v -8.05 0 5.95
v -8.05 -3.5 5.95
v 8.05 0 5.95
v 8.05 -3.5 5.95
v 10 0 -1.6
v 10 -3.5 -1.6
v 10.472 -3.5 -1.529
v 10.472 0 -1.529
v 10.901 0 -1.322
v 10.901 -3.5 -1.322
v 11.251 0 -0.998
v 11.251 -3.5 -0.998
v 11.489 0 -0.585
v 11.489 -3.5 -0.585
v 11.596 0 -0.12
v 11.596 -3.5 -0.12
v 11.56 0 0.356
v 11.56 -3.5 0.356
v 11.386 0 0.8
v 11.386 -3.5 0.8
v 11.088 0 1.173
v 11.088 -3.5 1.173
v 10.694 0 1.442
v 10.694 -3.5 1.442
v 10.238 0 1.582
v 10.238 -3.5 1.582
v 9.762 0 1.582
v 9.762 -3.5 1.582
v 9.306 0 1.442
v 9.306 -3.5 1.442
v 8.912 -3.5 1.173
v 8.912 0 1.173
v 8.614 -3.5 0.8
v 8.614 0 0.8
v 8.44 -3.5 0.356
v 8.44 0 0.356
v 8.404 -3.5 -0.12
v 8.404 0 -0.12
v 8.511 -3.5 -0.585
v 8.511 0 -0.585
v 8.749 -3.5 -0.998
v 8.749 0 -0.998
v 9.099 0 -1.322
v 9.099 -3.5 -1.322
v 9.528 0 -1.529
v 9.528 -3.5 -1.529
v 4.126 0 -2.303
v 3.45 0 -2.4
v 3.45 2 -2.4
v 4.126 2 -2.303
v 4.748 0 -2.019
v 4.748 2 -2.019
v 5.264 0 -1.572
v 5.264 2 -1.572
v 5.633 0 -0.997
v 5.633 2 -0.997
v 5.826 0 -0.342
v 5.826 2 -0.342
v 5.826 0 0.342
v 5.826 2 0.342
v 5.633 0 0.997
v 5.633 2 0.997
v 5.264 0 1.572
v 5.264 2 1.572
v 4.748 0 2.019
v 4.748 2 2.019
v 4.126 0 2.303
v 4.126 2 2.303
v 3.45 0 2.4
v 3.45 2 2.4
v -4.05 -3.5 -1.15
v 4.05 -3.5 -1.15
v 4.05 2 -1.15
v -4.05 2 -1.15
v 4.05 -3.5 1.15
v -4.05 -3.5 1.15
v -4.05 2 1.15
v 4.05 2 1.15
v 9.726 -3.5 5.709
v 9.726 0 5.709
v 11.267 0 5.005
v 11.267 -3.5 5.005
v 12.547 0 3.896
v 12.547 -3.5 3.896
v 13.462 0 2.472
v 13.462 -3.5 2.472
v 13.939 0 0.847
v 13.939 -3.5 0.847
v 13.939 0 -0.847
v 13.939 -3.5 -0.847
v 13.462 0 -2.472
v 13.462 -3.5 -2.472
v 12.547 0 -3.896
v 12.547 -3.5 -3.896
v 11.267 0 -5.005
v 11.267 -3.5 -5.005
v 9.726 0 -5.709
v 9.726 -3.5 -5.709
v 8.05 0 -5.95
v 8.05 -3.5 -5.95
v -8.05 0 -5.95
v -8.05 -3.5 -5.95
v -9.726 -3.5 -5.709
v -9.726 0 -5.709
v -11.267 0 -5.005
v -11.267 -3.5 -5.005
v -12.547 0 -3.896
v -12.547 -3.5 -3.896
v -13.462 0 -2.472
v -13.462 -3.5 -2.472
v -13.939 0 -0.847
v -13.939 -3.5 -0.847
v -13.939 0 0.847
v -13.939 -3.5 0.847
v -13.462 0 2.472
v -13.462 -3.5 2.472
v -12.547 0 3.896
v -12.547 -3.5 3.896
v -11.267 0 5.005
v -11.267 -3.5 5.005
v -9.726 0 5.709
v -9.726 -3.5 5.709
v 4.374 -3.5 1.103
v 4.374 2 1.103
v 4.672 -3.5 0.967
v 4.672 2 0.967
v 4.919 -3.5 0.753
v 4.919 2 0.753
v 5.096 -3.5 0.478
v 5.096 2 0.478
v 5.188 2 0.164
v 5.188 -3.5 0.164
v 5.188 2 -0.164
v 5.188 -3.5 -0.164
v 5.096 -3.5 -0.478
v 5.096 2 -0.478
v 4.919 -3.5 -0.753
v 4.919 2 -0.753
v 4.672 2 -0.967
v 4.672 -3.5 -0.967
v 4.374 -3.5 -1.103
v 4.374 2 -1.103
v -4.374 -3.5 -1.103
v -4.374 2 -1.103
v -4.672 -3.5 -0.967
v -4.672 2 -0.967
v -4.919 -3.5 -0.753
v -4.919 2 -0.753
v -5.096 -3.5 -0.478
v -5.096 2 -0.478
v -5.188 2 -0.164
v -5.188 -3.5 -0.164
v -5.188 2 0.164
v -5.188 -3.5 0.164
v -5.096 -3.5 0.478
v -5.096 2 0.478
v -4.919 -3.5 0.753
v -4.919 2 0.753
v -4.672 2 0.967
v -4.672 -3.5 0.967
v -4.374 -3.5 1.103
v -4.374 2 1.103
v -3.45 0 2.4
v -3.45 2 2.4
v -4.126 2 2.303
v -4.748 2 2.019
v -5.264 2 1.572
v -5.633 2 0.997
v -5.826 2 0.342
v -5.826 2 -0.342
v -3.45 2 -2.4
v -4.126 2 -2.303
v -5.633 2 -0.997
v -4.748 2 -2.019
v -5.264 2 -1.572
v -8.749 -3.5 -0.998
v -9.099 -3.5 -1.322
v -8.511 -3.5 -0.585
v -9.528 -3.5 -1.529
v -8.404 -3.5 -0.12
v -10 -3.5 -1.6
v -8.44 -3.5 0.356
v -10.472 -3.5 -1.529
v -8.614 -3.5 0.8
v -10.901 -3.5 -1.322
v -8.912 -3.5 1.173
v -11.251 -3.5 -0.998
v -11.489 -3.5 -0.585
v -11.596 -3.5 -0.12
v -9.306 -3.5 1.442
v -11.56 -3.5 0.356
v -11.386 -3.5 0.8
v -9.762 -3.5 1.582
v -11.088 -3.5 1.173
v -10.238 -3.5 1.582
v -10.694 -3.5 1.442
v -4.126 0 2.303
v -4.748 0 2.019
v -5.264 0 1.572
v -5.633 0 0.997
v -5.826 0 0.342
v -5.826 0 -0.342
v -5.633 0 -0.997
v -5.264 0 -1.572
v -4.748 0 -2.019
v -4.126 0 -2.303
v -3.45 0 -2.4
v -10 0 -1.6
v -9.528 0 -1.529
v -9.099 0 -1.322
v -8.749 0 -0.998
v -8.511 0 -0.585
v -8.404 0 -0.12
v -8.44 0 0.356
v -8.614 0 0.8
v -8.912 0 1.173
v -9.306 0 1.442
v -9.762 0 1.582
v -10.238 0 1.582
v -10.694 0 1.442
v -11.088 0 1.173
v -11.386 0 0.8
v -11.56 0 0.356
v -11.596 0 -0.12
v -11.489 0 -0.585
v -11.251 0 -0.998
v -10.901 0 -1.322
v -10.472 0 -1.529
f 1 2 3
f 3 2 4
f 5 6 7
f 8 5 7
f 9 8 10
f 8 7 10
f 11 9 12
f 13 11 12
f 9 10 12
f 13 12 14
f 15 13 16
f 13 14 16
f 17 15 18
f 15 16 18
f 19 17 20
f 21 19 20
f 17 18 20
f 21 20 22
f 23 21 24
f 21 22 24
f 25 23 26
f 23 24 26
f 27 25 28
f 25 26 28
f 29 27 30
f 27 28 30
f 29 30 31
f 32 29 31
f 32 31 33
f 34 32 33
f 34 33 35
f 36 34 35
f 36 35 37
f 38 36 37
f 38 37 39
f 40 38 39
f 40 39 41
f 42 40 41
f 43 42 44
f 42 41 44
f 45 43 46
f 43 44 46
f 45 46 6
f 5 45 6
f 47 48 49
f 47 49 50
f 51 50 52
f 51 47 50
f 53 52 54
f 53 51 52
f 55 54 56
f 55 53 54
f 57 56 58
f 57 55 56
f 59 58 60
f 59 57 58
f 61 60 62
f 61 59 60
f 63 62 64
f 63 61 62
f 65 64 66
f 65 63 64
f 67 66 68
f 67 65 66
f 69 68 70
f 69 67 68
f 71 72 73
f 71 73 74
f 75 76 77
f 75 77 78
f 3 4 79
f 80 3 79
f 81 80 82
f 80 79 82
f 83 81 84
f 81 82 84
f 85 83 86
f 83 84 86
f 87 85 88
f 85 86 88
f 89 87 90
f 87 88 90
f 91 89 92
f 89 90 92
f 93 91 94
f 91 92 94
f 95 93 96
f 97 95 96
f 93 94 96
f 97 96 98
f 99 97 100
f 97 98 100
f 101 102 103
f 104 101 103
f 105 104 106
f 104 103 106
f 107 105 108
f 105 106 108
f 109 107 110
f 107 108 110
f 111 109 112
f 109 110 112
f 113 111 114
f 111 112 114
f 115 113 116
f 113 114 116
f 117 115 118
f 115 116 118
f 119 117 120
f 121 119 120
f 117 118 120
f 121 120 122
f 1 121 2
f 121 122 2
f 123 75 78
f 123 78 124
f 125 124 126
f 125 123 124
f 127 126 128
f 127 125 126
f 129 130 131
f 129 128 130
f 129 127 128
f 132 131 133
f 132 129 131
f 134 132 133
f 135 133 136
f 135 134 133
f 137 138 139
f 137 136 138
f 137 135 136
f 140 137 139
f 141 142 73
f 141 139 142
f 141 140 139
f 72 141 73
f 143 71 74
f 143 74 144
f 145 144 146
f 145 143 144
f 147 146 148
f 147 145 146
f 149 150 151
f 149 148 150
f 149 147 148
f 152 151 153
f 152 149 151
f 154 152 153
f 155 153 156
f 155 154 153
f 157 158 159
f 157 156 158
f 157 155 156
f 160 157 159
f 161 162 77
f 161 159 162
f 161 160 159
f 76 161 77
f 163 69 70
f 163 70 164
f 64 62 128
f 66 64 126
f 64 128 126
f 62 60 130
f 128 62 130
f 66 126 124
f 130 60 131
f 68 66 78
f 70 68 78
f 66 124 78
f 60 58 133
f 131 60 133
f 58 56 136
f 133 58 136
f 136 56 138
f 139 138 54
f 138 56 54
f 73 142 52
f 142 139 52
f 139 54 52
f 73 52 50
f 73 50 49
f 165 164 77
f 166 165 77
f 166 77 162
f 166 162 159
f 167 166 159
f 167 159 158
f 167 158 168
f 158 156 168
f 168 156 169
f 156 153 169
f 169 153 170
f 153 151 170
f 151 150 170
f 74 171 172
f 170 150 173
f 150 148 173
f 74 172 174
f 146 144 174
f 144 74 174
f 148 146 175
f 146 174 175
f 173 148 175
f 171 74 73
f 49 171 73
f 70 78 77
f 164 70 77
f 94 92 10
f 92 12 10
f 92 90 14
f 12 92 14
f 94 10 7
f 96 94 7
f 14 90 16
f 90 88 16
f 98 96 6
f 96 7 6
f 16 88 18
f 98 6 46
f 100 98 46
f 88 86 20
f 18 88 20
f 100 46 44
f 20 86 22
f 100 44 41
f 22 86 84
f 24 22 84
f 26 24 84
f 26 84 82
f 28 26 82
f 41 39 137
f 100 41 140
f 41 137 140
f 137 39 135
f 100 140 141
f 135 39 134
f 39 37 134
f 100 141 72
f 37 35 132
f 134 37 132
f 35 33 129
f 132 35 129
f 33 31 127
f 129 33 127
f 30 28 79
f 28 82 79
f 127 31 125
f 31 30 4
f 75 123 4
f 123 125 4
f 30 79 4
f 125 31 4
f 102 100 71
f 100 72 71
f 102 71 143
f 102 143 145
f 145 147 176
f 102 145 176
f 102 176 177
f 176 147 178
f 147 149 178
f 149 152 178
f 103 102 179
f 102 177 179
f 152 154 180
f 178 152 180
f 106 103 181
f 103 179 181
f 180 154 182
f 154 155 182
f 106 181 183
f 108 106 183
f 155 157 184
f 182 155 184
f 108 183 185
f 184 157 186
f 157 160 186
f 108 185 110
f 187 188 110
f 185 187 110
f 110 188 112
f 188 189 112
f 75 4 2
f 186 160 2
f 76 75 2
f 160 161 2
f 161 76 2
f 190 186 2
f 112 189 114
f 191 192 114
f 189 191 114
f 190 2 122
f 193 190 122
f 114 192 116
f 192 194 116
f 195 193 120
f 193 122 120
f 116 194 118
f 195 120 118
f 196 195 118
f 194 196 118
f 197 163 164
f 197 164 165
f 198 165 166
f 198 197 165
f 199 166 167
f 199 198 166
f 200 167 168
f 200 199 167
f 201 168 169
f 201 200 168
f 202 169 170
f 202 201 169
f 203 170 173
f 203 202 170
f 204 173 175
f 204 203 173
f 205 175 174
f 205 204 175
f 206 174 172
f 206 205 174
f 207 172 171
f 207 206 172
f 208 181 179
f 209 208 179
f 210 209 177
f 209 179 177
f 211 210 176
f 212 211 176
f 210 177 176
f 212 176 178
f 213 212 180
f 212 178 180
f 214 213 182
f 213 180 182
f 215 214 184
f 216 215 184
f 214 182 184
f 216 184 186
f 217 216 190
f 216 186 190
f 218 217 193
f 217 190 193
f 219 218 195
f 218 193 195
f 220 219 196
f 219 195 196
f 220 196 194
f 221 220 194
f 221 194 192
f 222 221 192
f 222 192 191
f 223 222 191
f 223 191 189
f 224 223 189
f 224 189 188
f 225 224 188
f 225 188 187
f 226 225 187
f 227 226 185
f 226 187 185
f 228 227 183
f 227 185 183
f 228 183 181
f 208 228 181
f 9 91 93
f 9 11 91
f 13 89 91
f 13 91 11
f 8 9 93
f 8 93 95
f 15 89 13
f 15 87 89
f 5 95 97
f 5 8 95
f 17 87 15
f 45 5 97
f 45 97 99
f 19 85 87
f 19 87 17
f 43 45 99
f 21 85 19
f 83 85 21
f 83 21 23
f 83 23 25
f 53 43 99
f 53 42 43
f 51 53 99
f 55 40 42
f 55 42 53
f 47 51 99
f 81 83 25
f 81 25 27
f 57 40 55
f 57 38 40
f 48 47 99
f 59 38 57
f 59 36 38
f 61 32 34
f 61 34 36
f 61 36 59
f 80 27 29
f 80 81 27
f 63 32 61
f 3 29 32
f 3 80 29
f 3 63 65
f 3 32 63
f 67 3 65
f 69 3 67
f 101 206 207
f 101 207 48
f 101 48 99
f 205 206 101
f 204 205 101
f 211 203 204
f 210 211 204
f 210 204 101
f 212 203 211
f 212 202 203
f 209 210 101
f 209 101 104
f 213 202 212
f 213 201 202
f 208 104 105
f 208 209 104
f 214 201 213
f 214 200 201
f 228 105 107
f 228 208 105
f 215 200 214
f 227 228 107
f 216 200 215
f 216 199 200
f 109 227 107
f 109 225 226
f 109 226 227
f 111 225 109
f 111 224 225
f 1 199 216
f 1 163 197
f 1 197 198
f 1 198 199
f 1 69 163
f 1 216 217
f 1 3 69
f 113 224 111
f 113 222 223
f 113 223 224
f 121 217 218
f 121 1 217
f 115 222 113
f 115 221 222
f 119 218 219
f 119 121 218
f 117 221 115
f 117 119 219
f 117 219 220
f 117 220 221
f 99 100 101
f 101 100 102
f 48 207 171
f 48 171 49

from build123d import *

# Parameters (mm, degrees)
BOSS_EXTRUDE1_DEPTH = 2
BOSS_EXTRUDE2_START = 3.5
SKETCH2_R           = 1.6
BOSS_EXTRUDE2_DEPTH = 3.5


with BuildPart() as part:
    # Sketch1 → Boss-Extrude1 (new body)
    with BuildSketch(Plane(origin=(0, 0, 0), x_dir=(1, 0, 0), z_dir=(0, 1, 0))):
        with BuildLine():
            Line((-3.45, 2.4), (3.45, 2.4))
            ThreePointArc((3.45, 2.4), (5.85, 0), (3.45, -2.4))
            Line((3.45, -2.4), (-3.45, -2.4))
            ThreePointArc((-3.45, -2.4), (-5.85, 0), (-3.45, 2.4))
        make_face()
        with BuildLine():
            Line((-4.05, 1.15), (4.05, 1.15))
            ThreePointArc((4.05, 1.15), (5.2, 0), (4.05, -1.15))
            Line((4.05, -1.15), (-4.05, -1.15))
            ThreePointArc((-4.05, -1.15), (-5.2, 0), (-4.05, 1.15))
        make_face(mode=Mode.SUBTRACT)
    extrude(amount=BOSS_EXTRUDE1_DEPTH)

    # Sketch2 → Boss-Extrude2 (add)
    with BuildSketch(Plane.XZ.offset(BOSS_EXTRUDE2_START)):
        with BuildLine():
            Line((-8.05, 5.95), (8.05, 5.95))
            ThreePointArc((8.05, 5.95), (14, 0), (8.05, -5.95))
            Line((8.05, -5.95), (-8.05, -5.95))
            ThreePointArc((-8.05, -5.95), (-14, 0), (-8.05, 5.95))
        make_face()
        with Locations(Location((-10, 0, 0), (0, 0, 270))):
            Circle(SKETCH2_R, mode=Mode.SUBTRACT)
        with Locations(Location((10, 0, 0), (0, 0, 270))):
            Circle(SKETCH2_R, mode=Mode.SUBTRACT)
        with BuildLine():
            Line((4.05, -1.15), (-4.05, -1.15))
            ThreePointArc((-4.05, -1.15), (-5.2, 0), (-4.05, 1.15))
            Line((-4.05, 1.15), (4.05, 1.15))
            ThreePointArc((4.05, 1.15), (5.2, 0), (4.05, -1.15))
        make_face(mode=Mode.SUBTRACT)
    extrude(amount=-BOSS_EXTRUDE2_DEPTH)


solid = part.part
